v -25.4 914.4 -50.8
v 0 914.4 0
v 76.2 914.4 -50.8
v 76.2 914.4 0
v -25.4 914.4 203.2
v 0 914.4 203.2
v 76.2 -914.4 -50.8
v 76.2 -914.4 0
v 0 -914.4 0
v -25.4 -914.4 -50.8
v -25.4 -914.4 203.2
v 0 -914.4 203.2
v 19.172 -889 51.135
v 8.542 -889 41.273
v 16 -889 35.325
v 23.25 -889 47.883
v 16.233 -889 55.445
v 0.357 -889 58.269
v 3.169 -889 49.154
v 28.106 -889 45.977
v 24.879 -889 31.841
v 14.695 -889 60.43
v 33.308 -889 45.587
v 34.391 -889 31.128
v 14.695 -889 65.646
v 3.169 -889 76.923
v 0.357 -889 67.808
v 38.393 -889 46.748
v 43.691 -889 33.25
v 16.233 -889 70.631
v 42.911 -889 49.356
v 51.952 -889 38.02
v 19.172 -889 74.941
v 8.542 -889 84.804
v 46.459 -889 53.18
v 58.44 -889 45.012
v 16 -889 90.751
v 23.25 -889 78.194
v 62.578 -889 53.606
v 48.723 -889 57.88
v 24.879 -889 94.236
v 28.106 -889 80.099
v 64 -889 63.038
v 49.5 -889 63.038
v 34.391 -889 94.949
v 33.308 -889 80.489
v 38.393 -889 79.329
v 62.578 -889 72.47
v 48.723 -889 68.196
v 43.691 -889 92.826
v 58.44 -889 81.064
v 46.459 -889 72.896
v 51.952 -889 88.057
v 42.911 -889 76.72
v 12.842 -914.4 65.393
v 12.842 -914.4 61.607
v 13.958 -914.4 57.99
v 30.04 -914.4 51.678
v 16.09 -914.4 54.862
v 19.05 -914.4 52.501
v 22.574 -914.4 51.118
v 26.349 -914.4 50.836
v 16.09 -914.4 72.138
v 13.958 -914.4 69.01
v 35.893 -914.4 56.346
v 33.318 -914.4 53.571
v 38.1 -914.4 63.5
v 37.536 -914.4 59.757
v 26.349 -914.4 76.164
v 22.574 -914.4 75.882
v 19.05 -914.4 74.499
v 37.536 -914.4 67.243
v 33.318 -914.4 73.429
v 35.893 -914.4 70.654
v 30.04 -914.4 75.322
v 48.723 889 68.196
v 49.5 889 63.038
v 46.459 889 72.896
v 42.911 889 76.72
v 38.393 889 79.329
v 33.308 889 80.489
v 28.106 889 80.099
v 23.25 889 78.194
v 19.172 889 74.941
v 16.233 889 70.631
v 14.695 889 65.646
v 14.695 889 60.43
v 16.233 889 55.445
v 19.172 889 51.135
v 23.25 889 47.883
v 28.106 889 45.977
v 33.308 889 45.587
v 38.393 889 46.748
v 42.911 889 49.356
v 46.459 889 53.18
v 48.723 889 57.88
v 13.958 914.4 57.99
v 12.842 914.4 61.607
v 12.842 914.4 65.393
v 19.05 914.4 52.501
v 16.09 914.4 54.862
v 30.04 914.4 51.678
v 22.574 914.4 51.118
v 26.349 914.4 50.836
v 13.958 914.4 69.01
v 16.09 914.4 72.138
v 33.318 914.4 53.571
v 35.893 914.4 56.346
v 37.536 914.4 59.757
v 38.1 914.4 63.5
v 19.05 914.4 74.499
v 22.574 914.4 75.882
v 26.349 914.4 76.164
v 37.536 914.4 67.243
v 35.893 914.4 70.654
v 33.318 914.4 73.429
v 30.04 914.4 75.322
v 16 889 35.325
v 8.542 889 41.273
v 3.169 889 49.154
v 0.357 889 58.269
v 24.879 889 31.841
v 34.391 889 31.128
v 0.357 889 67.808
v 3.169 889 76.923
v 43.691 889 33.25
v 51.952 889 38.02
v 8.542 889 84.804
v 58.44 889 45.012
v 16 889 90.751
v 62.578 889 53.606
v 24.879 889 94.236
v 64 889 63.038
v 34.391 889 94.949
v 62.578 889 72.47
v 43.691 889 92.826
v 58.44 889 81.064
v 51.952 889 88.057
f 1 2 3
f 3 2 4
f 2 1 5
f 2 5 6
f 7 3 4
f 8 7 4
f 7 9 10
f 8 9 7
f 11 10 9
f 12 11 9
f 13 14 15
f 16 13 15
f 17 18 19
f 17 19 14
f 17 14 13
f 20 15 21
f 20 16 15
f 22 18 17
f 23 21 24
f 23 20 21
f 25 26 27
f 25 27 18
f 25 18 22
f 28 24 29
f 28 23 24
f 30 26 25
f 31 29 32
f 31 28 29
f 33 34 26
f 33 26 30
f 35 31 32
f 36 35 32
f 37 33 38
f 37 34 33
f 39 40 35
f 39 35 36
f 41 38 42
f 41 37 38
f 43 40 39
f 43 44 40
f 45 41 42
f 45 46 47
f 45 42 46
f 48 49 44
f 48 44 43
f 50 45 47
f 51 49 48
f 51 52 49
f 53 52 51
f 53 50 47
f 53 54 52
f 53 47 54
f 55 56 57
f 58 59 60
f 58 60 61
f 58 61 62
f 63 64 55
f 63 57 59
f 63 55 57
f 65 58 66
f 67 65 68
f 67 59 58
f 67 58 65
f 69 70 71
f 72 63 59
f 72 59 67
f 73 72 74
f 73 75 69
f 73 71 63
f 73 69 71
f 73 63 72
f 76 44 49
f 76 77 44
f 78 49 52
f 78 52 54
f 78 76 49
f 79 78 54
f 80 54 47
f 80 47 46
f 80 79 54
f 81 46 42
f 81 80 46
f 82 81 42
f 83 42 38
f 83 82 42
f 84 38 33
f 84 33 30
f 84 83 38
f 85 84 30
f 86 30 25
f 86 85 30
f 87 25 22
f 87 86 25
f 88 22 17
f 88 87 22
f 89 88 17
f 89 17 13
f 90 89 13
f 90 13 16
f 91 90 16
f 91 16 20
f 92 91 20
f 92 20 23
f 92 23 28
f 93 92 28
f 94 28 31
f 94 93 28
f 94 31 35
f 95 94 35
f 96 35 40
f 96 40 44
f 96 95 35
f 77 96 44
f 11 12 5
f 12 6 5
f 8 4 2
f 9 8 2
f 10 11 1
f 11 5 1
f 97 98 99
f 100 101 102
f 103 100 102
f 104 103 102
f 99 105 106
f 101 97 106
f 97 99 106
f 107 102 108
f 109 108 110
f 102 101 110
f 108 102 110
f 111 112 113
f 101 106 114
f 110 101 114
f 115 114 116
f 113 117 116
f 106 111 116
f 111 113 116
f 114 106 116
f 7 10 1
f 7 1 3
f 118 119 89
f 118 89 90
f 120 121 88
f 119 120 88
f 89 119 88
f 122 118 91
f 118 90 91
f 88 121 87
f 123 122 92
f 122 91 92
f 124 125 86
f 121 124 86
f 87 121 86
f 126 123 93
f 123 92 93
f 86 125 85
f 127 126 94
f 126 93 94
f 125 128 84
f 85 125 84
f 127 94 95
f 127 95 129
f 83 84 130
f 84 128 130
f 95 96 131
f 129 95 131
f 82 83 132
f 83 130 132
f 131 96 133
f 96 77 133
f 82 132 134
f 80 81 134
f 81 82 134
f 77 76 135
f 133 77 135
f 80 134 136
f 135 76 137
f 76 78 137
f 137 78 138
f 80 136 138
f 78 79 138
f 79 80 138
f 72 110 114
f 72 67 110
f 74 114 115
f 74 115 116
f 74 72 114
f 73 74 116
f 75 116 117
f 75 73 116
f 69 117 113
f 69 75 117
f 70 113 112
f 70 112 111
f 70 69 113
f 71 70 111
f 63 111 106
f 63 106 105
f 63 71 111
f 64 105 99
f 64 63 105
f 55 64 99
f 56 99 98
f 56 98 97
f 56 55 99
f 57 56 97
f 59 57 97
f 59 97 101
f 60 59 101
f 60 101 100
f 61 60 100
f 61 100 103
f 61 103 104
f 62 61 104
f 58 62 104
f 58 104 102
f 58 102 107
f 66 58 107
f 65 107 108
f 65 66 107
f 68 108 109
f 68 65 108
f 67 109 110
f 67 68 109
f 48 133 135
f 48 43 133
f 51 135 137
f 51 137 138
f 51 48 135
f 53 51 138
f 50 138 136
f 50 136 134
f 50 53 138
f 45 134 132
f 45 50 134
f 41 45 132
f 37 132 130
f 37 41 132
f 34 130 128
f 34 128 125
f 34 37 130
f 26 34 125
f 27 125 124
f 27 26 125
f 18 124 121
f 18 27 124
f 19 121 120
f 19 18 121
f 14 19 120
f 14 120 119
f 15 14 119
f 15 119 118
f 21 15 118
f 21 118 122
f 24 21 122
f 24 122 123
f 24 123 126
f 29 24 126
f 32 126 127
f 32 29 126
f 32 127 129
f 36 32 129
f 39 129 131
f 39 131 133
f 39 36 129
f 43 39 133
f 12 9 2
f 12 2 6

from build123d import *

# Parameters (mm, degrees)
F0_R     = 12.7
F1_DEPTH = 914.4
F2_R     = 32
F2_R_2   = 17.5
F3_DEPTH = 889


with BuildPart() as f1:
    # F0 (on Front) → F1 (new body, symmetric)
    with BuildSketch(Plane.XZ):
        Polygon((76.2, 0), (0, 0), (0, 203.2), (-25.4, 203.2), (-25.4, -50.8), (76.2, -50.8), align=None)
        with Locations((25.4, 63.5)):
            Circle(F0_R)
    extrude(amount=F1_DEPTH, both=True)


with BuildPart() as f3:
    # F2 (on Front) → F3 (new body, symmetric)
    with BuildSketch(Plane.XZ):
        with Locations((32, 63.038245)):
            Circle(F2_R)
        with Locations((32, 63.038245)):
            Circle(F2_R_2, mode=Mode.SUBTRACT)
    extrude(amount=F3_DEPTH, both=True)


solid = Compound([f1.part, f3.part])
